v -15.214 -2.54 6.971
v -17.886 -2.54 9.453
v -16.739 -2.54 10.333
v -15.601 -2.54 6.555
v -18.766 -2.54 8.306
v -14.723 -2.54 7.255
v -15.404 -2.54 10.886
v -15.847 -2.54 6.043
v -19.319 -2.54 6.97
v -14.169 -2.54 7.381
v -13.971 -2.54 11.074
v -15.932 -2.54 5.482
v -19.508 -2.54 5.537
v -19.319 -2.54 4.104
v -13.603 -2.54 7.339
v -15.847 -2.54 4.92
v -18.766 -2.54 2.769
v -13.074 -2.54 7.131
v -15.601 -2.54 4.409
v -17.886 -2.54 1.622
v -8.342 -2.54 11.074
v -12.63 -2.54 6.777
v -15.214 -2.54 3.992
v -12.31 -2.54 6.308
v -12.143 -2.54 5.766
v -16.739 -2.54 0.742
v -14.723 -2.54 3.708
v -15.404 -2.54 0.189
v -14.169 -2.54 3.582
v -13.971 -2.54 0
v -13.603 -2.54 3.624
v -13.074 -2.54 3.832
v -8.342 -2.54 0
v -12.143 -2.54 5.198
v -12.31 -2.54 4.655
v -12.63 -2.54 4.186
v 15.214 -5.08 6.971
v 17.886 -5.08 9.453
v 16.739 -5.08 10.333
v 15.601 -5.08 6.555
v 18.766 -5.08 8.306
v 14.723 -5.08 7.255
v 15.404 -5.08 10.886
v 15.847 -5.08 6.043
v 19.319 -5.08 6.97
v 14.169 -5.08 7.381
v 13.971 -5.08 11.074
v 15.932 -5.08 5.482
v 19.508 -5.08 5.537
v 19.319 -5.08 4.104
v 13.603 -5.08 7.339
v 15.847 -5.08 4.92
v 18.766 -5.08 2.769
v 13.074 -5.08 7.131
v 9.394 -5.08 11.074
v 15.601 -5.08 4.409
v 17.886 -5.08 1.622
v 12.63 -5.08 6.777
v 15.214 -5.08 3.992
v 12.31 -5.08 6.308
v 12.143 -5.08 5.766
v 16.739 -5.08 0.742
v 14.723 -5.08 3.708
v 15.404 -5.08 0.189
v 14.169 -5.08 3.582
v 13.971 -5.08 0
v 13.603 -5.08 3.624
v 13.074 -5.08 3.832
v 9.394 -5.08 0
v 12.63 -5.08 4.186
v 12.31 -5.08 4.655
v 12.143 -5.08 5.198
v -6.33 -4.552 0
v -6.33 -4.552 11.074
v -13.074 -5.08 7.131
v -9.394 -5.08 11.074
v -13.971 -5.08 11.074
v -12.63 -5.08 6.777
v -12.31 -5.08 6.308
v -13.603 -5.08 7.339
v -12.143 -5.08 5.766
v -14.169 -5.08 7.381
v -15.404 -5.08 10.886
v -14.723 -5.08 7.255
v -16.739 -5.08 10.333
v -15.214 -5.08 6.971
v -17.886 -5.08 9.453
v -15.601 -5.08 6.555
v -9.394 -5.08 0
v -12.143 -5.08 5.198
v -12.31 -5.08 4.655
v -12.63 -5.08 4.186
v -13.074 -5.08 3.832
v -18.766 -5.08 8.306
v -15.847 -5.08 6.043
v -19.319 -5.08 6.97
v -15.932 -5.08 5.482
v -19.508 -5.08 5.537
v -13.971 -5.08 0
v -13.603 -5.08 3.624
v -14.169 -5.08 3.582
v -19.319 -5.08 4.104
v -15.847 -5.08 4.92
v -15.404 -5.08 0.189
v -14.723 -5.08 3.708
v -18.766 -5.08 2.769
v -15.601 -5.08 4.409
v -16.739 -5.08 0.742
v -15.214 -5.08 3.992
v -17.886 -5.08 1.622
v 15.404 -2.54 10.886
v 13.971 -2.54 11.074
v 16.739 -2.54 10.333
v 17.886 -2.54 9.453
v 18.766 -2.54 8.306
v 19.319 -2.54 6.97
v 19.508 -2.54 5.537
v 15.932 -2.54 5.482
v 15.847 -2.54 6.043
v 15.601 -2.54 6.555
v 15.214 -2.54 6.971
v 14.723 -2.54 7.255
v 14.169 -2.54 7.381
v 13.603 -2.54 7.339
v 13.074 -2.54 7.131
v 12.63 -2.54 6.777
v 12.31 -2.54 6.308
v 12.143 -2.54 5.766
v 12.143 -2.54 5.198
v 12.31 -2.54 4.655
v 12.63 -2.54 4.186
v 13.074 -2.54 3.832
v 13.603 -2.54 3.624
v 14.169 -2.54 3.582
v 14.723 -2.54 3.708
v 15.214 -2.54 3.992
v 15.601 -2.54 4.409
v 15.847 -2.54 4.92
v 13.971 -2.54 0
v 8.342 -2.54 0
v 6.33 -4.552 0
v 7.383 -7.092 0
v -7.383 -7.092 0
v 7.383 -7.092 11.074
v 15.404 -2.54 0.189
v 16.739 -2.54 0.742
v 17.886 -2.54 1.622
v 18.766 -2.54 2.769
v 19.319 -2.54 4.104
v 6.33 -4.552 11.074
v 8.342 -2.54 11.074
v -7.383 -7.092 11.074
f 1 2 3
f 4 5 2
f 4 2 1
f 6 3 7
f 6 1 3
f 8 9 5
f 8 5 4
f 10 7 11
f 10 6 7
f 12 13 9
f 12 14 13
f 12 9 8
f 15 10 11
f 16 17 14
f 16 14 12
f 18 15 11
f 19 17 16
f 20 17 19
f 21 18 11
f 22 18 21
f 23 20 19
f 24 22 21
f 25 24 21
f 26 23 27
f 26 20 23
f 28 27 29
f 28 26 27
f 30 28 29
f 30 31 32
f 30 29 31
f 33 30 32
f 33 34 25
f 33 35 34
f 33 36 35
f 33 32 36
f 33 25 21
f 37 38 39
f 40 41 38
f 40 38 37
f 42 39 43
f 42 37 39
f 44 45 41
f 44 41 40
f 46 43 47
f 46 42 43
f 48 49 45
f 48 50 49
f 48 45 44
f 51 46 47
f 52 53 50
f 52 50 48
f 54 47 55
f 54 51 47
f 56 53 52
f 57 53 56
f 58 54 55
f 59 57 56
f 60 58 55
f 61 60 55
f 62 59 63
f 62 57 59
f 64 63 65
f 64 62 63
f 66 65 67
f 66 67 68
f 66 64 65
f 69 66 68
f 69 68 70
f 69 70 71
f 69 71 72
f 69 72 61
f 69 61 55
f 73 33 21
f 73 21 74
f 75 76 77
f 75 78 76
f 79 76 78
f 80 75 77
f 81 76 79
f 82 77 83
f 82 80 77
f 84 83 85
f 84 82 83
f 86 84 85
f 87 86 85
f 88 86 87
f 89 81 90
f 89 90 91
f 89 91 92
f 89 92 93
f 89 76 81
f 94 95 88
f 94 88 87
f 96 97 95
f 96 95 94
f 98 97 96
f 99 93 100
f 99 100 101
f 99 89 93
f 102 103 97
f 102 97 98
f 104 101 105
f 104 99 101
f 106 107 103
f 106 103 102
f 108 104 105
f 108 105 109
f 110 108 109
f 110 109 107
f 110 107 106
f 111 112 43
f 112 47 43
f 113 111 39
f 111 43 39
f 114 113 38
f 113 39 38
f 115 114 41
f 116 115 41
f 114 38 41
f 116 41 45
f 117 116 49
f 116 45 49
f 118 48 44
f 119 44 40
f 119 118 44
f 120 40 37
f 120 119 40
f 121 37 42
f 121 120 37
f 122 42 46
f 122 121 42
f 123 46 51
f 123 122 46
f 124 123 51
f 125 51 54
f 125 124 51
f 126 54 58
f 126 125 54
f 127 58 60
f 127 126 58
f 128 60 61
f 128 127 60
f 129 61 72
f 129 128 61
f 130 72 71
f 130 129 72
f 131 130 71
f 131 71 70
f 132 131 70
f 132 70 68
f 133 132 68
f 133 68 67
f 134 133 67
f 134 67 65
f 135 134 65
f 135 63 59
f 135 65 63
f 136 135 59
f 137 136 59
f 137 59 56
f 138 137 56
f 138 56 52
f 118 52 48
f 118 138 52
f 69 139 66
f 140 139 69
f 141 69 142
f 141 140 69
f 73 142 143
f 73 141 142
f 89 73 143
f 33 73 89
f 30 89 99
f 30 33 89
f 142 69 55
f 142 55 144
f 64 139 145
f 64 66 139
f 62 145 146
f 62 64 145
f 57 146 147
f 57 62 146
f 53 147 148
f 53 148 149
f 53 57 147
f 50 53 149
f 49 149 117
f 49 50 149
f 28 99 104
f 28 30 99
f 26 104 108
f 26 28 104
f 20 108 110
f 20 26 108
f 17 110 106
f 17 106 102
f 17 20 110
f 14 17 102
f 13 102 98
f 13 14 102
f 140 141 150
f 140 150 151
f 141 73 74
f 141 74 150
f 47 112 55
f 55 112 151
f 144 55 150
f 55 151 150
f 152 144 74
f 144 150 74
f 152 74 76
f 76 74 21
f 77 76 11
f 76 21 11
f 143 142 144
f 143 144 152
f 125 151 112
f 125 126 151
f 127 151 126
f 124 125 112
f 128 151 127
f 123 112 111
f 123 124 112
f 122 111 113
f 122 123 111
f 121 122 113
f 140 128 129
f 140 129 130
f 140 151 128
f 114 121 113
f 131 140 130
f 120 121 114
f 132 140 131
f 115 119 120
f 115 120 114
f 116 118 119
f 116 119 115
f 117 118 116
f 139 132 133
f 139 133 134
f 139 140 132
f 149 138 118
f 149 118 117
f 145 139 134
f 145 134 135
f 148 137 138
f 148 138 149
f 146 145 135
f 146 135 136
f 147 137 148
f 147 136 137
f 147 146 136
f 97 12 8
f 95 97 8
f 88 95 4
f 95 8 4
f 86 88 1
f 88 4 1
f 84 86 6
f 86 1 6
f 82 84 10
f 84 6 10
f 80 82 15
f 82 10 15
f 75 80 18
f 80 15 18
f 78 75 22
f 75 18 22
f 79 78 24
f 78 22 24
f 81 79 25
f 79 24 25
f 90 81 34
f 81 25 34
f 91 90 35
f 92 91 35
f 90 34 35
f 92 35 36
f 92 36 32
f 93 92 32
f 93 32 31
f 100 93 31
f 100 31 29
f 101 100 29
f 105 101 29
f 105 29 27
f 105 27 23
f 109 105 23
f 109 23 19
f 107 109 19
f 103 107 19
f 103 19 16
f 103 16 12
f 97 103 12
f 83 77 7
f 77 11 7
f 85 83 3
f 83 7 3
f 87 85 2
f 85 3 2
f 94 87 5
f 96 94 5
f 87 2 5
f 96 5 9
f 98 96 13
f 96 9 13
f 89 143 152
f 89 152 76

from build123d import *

# Parameters (mm, degrees)
BASE_EXTRUDE_DEPTH = 11.0744
SKETCH2_R          = 1.905
CUT_EXTRUDE1_DEPTH = 23.889284907
FILLET1_R          = 5.5372


with BuildPart() as part:
    # Sketch1 → Base-Extrude (new body)
    with BuildSketch(Plane.XY):
        Polygon((-8.342087552, -2.54), (-6.330407552, -4.55168), (6.330407552, -4.55168), (8.342087552, -2.54), (19.507927552, -2.54), (19.507927552, -5.08), (9.39419, -5.08), (7.38251, -7.09168), (-7.38251, -7.09168), (-9.39419, -5.08), (-19.507927552, -5.08), (-19.507927552, -2.54), align=None)
    extrude(amount=BASE_EXTRUDE_DEPTH)

    # Sketch2 → Cut-Extrude1 (cut, through all)
    with BuildSketch(Plane(origin=(0, -2.54, 0), x_dir=(-1, 0, 0), z_dir=(0, 1, 0))):
        with Locations((14.026607552, 5.481627302)):
            Circle(SKETCH2_R)
    cut_extrude1 = extrude(amount=-CUT_EXTRUDE1_DEPTH, mode=Mode.SUBTRACT)

    # Mirror1: Cut-Extrude1 across plane
    add(cut_extrude1.mirror(Plane(origin=(0, 0, 0), x_dir=(0, 0, 1), z_dir=(1, 0, 0))), mode=Mode.SUBTRACT)

    # Fillet1
    fillet1_edges = [part.edges().sort_by_distance(p)[0] for p in [
        (19.507927552, -3.81, 0),
        (-19.507927552, -3.81, 0),
        (19.507927552, -3.81, 11.0744),
        (-19.507927552, -3.81, 11.0744),
    ]]
    fillet(fillet1_edges, radius=FILLET1_R - 0.0001)  # a hair under: the kernel refuses the full size


solid = part.part
